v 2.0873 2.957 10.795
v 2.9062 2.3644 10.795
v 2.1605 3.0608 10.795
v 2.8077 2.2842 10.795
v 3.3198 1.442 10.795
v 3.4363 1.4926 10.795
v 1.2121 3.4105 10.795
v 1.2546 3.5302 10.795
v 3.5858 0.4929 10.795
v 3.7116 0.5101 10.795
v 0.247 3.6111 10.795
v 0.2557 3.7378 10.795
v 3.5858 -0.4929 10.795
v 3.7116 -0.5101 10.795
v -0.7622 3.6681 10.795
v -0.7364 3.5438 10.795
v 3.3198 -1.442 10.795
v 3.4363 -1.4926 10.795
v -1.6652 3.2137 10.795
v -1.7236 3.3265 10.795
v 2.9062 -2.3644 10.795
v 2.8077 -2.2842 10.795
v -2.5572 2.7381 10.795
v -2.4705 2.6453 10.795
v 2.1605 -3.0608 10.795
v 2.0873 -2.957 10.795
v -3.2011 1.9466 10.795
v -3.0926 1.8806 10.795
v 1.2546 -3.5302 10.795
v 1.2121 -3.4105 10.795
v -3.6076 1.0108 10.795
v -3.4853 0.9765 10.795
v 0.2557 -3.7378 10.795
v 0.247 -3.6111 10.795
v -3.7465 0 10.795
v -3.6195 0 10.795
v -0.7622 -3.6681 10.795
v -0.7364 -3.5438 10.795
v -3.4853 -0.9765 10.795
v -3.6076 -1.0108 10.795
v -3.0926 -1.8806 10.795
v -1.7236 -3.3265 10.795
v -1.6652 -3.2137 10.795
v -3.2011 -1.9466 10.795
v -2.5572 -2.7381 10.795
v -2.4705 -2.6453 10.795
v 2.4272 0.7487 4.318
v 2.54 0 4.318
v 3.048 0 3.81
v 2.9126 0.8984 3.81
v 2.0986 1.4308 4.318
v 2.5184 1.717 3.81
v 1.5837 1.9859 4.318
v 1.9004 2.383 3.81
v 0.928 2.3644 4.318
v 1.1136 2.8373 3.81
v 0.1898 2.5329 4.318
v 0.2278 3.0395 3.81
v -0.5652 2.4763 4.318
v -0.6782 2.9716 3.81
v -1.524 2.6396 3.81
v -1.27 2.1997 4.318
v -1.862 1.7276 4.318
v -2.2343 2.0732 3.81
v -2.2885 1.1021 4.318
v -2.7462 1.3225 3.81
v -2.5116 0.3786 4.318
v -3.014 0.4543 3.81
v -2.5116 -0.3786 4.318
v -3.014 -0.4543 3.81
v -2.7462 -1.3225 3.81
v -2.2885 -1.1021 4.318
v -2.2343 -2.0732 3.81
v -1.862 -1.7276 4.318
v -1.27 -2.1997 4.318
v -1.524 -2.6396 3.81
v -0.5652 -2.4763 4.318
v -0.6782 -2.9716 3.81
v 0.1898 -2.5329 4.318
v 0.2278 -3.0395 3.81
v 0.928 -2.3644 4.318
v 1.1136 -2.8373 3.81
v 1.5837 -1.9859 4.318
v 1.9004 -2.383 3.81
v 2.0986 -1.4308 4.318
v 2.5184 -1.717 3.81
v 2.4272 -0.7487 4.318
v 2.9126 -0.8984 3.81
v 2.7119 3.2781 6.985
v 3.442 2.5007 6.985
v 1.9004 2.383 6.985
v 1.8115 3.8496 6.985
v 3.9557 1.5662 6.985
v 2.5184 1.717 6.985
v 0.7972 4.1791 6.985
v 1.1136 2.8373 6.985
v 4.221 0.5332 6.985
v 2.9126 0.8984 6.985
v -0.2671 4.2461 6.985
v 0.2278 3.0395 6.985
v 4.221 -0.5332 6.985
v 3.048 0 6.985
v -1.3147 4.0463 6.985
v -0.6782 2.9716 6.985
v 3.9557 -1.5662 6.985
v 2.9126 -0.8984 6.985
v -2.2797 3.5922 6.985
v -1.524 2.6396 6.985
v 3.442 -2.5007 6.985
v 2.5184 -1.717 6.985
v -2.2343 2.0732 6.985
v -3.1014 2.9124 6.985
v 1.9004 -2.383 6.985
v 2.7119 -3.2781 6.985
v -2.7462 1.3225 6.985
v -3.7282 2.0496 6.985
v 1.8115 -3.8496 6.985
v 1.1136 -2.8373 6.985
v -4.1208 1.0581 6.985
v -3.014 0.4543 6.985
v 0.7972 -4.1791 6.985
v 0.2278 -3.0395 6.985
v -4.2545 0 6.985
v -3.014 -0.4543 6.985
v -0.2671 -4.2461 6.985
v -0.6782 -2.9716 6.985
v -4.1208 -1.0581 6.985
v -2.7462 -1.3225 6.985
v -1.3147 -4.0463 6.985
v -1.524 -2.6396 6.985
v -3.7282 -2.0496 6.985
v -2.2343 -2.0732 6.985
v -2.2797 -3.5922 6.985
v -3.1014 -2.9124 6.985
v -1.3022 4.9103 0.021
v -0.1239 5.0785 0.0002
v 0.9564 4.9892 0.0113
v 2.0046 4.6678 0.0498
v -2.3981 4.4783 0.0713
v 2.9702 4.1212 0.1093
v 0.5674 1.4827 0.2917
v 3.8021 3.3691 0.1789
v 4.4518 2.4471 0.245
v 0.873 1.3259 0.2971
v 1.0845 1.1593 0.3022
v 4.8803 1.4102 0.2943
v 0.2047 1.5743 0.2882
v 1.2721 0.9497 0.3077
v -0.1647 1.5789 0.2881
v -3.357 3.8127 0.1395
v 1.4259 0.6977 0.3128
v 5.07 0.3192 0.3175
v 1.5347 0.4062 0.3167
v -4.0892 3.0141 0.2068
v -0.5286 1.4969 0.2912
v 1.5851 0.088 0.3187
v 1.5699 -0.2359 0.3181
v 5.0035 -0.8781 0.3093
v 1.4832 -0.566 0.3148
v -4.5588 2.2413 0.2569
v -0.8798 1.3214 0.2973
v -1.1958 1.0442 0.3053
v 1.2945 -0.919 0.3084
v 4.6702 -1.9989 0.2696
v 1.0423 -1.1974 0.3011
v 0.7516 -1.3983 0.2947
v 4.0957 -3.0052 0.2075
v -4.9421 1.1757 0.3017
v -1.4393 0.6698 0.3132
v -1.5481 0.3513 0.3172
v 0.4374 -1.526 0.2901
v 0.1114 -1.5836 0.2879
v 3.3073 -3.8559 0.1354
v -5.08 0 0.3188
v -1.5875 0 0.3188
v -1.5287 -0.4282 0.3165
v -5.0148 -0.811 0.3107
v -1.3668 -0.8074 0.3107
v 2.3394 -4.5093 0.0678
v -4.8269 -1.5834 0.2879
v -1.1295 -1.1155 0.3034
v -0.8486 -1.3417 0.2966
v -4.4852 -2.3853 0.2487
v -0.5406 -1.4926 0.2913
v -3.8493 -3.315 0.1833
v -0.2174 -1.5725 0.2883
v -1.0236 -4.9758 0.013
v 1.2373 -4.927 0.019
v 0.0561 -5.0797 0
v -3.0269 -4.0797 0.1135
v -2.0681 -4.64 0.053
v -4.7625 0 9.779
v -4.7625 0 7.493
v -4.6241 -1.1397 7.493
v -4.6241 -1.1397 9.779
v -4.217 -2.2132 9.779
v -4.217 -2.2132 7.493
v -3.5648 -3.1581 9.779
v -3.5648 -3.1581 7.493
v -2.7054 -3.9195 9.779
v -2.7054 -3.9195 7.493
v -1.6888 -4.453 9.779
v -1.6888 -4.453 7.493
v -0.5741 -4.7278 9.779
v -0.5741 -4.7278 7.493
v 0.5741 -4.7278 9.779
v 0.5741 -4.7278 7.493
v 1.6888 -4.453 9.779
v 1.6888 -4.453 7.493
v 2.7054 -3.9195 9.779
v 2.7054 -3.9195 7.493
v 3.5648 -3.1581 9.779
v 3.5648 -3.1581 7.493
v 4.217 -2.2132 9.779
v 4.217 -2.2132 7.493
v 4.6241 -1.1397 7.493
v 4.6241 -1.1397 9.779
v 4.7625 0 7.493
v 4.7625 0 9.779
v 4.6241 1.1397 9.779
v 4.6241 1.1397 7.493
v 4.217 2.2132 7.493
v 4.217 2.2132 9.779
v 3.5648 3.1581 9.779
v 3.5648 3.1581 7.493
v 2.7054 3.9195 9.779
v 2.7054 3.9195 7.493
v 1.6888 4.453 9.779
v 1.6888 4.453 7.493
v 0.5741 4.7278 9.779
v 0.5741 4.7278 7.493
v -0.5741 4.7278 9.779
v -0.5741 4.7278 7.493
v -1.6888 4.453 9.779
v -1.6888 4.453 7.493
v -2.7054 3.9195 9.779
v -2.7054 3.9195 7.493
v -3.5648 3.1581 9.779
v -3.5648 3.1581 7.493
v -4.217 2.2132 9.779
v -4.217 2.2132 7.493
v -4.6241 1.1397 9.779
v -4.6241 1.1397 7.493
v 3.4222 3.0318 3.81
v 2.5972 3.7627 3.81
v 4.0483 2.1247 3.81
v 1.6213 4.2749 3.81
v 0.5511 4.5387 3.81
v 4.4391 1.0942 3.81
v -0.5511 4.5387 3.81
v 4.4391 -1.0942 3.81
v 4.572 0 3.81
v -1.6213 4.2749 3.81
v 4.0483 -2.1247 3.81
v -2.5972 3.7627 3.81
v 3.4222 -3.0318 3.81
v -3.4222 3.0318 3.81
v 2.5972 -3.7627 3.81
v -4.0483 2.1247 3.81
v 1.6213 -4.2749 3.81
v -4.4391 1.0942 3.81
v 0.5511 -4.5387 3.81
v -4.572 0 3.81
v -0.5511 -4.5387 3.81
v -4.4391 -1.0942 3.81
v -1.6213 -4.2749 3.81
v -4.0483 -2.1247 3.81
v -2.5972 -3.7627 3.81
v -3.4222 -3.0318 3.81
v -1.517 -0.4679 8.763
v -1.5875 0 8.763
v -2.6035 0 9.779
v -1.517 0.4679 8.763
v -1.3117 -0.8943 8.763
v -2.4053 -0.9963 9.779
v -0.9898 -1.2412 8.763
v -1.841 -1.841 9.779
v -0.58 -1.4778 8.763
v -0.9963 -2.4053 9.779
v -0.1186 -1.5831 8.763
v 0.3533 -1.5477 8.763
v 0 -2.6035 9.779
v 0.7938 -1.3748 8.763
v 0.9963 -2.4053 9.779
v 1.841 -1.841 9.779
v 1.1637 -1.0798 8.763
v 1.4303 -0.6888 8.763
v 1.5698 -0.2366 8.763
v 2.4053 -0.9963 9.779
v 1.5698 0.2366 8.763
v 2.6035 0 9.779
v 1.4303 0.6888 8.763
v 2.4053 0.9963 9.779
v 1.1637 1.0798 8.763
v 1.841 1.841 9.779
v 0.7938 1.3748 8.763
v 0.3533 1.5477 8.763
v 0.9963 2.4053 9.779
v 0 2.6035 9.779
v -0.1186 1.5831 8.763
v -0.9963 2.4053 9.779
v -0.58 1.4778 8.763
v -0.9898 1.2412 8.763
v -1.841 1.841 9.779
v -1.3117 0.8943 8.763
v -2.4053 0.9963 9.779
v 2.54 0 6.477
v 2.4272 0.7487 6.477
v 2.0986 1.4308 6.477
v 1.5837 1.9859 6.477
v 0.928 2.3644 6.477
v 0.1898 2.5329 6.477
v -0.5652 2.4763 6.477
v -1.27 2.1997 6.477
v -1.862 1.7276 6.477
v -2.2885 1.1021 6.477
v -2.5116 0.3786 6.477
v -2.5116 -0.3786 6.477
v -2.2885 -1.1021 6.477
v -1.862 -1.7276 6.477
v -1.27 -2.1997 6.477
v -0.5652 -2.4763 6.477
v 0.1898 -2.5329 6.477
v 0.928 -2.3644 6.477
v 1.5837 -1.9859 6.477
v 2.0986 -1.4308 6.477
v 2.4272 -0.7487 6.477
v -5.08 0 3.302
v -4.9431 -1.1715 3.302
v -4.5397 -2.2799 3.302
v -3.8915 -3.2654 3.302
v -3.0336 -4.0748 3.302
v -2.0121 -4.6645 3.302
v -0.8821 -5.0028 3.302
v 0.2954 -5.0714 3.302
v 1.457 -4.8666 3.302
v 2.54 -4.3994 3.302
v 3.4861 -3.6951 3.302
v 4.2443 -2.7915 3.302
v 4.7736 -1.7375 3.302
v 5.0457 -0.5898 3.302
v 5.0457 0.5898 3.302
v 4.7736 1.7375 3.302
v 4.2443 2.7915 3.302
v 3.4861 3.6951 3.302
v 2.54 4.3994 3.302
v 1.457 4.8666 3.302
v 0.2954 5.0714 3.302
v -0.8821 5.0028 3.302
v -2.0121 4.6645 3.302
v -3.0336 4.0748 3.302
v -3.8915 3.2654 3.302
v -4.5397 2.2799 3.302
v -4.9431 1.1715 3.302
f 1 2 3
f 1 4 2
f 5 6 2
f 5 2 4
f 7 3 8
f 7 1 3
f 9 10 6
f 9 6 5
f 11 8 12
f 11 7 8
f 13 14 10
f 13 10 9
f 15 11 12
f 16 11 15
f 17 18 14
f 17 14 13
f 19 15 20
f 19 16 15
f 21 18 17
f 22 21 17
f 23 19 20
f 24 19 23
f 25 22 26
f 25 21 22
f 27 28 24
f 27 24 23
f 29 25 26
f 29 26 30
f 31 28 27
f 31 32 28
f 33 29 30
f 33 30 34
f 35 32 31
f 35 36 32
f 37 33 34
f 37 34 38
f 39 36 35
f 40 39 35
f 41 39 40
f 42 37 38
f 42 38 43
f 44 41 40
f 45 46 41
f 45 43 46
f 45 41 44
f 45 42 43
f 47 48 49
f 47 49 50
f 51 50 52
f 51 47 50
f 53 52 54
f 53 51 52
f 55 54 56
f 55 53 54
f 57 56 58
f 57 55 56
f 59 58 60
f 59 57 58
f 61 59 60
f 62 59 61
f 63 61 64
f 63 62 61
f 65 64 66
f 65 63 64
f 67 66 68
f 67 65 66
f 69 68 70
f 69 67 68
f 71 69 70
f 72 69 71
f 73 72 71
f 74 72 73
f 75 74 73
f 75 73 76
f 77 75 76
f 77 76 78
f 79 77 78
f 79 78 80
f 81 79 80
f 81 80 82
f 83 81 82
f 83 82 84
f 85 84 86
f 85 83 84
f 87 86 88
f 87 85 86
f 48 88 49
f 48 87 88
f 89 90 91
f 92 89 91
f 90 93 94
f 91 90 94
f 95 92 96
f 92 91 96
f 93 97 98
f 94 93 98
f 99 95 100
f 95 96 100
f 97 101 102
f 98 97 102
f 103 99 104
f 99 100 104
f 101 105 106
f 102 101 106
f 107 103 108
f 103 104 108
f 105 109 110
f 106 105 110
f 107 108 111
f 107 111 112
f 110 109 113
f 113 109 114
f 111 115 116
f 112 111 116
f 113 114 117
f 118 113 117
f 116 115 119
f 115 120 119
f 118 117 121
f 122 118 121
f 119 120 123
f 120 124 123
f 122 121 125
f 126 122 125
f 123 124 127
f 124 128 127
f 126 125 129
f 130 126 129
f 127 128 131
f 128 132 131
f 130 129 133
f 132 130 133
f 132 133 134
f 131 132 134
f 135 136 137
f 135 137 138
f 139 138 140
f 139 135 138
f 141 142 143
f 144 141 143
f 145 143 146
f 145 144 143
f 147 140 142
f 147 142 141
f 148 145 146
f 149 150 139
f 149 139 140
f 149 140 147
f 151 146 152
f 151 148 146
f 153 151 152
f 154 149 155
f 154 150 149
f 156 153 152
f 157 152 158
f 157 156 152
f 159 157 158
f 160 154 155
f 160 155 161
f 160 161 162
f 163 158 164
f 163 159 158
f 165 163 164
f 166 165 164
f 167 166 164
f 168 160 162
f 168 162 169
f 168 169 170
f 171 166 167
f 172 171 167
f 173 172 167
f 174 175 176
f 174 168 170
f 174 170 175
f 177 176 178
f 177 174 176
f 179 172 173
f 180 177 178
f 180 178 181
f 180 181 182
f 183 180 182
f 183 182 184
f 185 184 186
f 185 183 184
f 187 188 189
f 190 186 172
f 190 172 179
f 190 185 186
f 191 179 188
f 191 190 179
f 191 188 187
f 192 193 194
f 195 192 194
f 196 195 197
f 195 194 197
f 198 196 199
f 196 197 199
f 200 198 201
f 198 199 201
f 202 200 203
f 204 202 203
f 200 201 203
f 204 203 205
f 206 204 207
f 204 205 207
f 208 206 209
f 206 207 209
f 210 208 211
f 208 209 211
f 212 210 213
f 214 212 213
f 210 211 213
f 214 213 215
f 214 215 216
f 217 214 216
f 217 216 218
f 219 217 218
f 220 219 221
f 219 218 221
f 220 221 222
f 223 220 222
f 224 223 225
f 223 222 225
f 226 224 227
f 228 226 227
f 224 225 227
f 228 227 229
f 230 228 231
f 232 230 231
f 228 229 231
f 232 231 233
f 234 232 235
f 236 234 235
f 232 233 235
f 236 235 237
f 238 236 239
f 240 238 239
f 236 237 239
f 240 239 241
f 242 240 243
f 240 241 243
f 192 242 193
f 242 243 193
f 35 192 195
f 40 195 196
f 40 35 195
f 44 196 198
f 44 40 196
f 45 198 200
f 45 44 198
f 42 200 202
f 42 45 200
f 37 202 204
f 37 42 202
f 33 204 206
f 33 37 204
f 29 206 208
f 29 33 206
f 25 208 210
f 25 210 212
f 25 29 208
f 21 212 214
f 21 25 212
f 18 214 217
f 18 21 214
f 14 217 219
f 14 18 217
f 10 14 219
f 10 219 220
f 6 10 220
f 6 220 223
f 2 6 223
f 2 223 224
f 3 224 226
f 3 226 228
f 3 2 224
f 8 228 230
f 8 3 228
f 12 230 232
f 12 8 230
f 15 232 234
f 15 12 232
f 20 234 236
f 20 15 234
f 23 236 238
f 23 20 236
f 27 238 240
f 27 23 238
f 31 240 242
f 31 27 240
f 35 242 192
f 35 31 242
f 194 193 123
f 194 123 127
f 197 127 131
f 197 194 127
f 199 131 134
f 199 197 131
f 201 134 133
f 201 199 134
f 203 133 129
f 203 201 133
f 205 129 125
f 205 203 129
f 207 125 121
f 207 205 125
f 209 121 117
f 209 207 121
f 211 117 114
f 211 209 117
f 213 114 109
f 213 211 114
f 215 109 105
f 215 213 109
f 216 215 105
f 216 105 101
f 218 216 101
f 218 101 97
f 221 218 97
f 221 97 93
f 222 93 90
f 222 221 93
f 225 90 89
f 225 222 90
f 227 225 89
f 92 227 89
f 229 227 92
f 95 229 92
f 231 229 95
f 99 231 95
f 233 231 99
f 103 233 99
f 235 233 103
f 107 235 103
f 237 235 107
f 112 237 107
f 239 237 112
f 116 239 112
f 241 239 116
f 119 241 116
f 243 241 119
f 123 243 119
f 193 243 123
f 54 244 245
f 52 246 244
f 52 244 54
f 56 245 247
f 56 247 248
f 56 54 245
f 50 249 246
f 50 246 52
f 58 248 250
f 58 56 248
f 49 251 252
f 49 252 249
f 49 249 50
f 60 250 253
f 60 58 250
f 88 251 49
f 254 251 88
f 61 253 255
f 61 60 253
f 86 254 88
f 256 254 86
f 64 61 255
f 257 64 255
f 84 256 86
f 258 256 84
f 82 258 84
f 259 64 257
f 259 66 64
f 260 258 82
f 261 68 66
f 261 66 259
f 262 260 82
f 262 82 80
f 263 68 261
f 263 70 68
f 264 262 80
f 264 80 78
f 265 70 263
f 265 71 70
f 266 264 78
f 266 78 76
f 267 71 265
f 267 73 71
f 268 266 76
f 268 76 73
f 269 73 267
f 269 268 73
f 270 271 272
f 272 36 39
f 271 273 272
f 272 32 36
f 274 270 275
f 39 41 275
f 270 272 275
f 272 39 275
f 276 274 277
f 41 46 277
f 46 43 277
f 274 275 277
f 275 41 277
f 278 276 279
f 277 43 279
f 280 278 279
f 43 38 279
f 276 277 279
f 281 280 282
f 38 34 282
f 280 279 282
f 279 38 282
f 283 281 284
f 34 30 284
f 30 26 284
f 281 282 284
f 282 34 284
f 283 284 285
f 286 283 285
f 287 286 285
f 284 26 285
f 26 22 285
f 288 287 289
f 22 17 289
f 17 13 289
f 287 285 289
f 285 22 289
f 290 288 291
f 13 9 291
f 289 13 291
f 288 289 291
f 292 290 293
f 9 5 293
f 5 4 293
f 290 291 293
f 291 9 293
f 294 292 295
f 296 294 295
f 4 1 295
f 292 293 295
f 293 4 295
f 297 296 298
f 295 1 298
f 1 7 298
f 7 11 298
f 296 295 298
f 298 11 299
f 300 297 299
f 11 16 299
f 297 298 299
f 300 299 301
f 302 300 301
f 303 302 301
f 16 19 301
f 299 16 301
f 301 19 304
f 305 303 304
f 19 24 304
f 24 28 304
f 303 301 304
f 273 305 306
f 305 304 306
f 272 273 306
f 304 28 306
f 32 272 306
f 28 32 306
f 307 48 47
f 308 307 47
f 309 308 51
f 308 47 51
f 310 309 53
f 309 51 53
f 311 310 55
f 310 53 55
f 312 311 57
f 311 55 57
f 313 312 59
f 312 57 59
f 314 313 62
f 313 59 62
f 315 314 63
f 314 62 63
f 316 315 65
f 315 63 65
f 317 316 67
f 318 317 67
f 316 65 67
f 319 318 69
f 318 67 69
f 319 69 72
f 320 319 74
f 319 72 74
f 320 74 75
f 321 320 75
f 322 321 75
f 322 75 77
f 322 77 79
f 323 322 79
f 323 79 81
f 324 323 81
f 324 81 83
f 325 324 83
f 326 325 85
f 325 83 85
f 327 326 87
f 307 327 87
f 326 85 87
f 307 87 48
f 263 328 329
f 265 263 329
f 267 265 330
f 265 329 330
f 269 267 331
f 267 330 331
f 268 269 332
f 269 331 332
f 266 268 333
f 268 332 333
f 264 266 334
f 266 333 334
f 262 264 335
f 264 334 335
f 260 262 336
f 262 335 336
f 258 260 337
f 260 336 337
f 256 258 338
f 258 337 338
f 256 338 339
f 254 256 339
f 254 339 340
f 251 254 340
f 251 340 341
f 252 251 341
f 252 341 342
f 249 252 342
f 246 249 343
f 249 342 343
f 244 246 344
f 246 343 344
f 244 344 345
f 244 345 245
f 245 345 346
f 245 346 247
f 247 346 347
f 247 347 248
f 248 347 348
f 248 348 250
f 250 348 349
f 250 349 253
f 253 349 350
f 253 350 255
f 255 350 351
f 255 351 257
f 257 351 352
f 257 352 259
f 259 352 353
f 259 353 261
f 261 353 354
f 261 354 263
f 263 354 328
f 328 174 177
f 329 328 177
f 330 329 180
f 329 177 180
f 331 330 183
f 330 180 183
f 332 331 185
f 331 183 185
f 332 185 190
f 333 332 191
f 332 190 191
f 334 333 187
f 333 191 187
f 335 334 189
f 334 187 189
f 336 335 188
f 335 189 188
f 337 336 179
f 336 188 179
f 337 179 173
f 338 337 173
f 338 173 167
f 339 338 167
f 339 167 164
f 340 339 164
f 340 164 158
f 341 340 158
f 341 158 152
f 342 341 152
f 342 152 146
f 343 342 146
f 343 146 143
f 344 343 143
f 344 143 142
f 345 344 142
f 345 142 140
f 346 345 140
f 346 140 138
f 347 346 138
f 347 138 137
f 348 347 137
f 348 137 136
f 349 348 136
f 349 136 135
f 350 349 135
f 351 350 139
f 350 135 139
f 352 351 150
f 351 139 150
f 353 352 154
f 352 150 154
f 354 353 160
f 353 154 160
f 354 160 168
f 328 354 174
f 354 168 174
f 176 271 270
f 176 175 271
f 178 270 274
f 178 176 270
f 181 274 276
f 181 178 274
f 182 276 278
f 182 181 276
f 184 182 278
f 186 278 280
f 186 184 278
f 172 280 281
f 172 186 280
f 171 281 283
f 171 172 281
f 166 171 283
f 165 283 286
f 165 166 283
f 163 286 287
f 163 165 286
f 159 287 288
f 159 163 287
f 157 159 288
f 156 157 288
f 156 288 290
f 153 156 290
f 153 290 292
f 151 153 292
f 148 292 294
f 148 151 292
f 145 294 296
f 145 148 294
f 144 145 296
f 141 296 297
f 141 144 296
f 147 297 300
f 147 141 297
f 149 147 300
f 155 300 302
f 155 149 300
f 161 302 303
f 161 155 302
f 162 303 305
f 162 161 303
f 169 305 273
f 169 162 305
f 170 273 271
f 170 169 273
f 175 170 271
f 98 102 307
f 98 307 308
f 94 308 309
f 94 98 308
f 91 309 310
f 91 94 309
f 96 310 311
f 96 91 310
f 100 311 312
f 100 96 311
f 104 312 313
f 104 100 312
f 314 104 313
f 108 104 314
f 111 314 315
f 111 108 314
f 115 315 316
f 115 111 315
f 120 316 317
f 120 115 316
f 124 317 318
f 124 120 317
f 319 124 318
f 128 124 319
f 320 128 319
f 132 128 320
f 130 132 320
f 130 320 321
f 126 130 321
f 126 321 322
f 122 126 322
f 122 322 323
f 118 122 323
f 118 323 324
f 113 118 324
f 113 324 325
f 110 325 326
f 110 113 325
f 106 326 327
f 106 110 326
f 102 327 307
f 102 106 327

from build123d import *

# Parameters (mm, degrees)
SKETCH1_R               = 5.08
SKETCH1_R_2             = 1.5875
BOSS_EXTRUDE1_DEPTH     = 3.81
SKETCH2_R               = 2.54
SKETCH2_R_2             = 1.5875
BOSS_EXTRUDE2_DEPTH     = 3.175
SKETCH3_R               = 4.7625
SKETCH3_R_2             = 1.5875
BOSS_EXTRUDE3_DEPTH     = 3.81
CHAMFER1_SIZE           = 0.508
CHAMFER2_SIZE           = 0.508
CHAMFER3_SIZE           = 2.032
CUT_EXTRUDE1_DEPTH      = 13.967066939
CUT_EXTRUDE1_DEPTH_BACK = 13.967066939
SKETCH4_R               = 40.64
CHAMFER4_SIZE           = 1.016


with BuildPart() as part:
    # Sketch1 → Boss-Extrude1 (new body)
    with BuildSketch(Plane.XY):
        with Locations(Location((0, 0, 0), (0, 0, 180))):
            Circle(SKETCH1_R)
        with Locations(Location((0, 0, 0), (0, 0, 180))):
            Circle(SKETCH1_R_2, mode=Mode.SUBTRACT)
    extrude(amount=BOSS_EXTRUDE1_DEPTH)

    # Sketch2 → Boss-Extrude2 (add)
    with BuildSketch(Plane.XY.offset(3.81)):
        Circle(SKETCH2_R)
        with Locations(Location((0, 0, 0), (0, 0, 180))):
            Circle(SKETCH2_R_2, mode=Mode.SUBTRACT)
    extrude(amount=BOSS_EXTRUDE2_DEPTH)

    # Sketch3 → Boss-Extrude3 (add)
    with BuildSketch(Plane.XY.offset(6.985)):
        with Locations(Location((0, 0, 0), (0, 0, 180))):
            Circle(SKETCH3_R)
        with Locations(Location((0, 0, 0), (0, 0, 180))):
            Circle(SKETCH3_R_2, mode=Mode.SUBTRACT)
    extrude(amount=BOSS_EXTRUDE3_DEPTH)

    # Chamfer1
    chamfer1_edges = [part.edges().sort_by_distance(p)[0] for p in [
        (-2.54, 0, 6.985),
        (-2.54, 0, 3.81),
    ]]
    chamfer(chamfer1_edges, length=CHAMFER1_SIZE)

    # Chamfer2
    chamfer2_edges = [part.edges().sort_by_distance(p)[0] for p in [
        (4.7625, 0, 6.985),
        (5.08, 0, 3.81),
    ]]
    chamfer(chamfer2_edges, length=CHAMFER2_SIZE)

    # Chamfer3
    chamfer3_edges = [part.edges().sort_by_distance(p)[0] for p in [
        (1.5875, 0, 10.795),
    ]]
    chamfer(chamfer3_edges, length=CHAMFER3_SIZE)

    # Sketch4 → Cut-Extrude1 (cut, two sides: drawn at the far end of the back side and taken through both)
    with BuildSketch(Plane(origin=(0, 0, 0), x_dir=(0, 0, -1), z_dir=(1, 0, 0)).offset(-CUT_EXTRUDE1_DEPTH_BACK)):
        with Locations((40.321249981, 0)):
            Circle(SKETCH4_R)
    extrude(amount=CUT_EXTRUDE1_DEPTH + CUT_EXTRUDE1_DEPTH_BACK, mode=Mode.SUBTRACT)

    # Chamfer4
    chamfer4_edges = [part.edges().sort_by_distance(p)[0] for p in [
        (4.7625, 0, 10.795),
    ]]
    chamfer(chamfer4_edges, length=CHAMFER4_SIZE)


solid = part.part
